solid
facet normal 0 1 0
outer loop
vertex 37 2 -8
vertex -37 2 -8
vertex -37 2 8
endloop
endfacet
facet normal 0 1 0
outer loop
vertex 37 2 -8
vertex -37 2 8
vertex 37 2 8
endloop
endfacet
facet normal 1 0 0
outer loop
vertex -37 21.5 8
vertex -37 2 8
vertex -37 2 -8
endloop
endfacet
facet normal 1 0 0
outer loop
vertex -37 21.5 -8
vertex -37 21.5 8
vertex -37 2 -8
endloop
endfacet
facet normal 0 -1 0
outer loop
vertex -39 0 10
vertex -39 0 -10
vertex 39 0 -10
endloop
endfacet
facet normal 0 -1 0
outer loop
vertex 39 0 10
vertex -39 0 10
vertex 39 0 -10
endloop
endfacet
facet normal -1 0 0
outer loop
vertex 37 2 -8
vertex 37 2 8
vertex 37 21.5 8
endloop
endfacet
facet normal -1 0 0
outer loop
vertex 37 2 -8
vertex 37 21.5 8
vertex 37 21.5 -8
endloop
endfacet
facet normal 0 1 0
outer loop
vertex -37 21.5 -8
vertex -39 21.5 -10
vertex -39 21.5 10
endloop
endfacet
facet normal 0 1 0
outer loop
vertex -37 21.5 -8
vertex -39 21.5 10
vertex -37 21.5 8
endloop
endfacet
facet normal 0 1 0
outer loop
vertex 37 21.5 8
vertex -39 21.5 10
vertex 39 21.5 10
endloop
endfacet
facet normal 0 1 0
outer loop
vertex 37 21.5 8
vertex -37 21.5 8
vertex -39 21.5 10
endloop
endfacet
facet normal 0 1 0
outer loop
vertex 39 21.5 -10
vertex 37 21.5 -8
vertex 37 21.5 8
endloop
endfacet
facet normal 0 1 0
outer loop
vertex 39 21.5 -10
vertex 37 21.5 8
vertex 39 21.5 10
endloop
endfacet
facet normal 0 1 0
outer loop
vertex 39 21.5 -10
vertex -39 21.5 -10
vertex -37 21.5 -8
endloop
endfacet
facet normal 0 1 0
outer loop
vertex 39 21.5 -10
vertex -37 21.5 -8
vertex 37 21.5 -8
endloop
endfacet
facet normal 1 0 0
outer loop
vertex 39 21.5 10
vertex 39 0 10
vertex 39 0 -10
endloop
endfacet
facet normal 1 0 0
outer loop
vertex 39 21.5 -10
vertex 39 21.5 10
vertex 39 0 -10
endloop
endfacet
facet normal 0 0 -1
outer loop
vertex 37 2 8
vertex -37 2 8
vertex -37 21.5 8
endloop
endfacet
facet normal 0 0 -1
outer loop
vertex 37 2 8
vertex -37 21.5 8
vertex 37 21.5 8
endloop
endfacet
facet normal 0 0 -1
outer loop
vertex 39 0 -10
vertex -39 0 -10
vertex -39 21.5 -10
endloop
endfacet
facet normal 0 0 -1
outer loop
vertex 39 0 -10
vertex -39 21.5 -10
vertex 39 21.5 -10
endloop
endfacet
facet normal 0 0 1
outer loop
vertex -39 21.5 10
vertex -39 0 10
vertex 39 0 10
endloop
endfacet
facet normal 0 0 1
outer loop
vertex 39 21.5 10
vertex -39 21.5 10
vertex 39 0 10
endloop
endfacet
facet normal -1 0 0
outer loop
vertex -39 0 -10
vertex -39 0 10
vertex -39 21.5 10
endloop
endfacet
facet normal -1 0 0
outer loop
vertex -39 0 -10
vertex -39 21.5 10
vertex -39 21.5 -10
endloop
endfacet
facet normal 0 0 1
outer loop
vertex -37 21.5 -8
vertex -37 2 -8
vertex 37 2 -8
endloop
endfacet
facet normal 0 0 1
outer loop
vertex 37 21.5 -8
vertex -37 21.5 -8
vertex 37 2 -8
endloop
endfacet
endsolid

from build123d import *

# Parameters (mm, degrees)
SKETCH_1_W      = 78
SKETCH_1_H      = 20
EXTRUDE_1_DEPTH = 21.5
SHELL_1_T       = -2


with BuildPart() as part:
    # Эскиз1 → Бобышка-Вытянуть1 (new body)
    with BuildSketch(Plane(origin=(0, 0, 0), x_dir=(1, 0, 0), z_dir=(0, 1, 0))):
        Rectangle(SKETCH_1_W, SKETCH_1_H)
    extrude(amount=EXTRUDE_1_DEPTH)

    # Оболочка1
    shell_1_openings = [part.faces().sort_by_distance(p)[0] for p in [
        (0, 21.5, 0),
    ]]
    offset(amount=SHELL_1_T, openings=shell_1_openings, kind=Kind.INTERSECTION)


solid = part.part
